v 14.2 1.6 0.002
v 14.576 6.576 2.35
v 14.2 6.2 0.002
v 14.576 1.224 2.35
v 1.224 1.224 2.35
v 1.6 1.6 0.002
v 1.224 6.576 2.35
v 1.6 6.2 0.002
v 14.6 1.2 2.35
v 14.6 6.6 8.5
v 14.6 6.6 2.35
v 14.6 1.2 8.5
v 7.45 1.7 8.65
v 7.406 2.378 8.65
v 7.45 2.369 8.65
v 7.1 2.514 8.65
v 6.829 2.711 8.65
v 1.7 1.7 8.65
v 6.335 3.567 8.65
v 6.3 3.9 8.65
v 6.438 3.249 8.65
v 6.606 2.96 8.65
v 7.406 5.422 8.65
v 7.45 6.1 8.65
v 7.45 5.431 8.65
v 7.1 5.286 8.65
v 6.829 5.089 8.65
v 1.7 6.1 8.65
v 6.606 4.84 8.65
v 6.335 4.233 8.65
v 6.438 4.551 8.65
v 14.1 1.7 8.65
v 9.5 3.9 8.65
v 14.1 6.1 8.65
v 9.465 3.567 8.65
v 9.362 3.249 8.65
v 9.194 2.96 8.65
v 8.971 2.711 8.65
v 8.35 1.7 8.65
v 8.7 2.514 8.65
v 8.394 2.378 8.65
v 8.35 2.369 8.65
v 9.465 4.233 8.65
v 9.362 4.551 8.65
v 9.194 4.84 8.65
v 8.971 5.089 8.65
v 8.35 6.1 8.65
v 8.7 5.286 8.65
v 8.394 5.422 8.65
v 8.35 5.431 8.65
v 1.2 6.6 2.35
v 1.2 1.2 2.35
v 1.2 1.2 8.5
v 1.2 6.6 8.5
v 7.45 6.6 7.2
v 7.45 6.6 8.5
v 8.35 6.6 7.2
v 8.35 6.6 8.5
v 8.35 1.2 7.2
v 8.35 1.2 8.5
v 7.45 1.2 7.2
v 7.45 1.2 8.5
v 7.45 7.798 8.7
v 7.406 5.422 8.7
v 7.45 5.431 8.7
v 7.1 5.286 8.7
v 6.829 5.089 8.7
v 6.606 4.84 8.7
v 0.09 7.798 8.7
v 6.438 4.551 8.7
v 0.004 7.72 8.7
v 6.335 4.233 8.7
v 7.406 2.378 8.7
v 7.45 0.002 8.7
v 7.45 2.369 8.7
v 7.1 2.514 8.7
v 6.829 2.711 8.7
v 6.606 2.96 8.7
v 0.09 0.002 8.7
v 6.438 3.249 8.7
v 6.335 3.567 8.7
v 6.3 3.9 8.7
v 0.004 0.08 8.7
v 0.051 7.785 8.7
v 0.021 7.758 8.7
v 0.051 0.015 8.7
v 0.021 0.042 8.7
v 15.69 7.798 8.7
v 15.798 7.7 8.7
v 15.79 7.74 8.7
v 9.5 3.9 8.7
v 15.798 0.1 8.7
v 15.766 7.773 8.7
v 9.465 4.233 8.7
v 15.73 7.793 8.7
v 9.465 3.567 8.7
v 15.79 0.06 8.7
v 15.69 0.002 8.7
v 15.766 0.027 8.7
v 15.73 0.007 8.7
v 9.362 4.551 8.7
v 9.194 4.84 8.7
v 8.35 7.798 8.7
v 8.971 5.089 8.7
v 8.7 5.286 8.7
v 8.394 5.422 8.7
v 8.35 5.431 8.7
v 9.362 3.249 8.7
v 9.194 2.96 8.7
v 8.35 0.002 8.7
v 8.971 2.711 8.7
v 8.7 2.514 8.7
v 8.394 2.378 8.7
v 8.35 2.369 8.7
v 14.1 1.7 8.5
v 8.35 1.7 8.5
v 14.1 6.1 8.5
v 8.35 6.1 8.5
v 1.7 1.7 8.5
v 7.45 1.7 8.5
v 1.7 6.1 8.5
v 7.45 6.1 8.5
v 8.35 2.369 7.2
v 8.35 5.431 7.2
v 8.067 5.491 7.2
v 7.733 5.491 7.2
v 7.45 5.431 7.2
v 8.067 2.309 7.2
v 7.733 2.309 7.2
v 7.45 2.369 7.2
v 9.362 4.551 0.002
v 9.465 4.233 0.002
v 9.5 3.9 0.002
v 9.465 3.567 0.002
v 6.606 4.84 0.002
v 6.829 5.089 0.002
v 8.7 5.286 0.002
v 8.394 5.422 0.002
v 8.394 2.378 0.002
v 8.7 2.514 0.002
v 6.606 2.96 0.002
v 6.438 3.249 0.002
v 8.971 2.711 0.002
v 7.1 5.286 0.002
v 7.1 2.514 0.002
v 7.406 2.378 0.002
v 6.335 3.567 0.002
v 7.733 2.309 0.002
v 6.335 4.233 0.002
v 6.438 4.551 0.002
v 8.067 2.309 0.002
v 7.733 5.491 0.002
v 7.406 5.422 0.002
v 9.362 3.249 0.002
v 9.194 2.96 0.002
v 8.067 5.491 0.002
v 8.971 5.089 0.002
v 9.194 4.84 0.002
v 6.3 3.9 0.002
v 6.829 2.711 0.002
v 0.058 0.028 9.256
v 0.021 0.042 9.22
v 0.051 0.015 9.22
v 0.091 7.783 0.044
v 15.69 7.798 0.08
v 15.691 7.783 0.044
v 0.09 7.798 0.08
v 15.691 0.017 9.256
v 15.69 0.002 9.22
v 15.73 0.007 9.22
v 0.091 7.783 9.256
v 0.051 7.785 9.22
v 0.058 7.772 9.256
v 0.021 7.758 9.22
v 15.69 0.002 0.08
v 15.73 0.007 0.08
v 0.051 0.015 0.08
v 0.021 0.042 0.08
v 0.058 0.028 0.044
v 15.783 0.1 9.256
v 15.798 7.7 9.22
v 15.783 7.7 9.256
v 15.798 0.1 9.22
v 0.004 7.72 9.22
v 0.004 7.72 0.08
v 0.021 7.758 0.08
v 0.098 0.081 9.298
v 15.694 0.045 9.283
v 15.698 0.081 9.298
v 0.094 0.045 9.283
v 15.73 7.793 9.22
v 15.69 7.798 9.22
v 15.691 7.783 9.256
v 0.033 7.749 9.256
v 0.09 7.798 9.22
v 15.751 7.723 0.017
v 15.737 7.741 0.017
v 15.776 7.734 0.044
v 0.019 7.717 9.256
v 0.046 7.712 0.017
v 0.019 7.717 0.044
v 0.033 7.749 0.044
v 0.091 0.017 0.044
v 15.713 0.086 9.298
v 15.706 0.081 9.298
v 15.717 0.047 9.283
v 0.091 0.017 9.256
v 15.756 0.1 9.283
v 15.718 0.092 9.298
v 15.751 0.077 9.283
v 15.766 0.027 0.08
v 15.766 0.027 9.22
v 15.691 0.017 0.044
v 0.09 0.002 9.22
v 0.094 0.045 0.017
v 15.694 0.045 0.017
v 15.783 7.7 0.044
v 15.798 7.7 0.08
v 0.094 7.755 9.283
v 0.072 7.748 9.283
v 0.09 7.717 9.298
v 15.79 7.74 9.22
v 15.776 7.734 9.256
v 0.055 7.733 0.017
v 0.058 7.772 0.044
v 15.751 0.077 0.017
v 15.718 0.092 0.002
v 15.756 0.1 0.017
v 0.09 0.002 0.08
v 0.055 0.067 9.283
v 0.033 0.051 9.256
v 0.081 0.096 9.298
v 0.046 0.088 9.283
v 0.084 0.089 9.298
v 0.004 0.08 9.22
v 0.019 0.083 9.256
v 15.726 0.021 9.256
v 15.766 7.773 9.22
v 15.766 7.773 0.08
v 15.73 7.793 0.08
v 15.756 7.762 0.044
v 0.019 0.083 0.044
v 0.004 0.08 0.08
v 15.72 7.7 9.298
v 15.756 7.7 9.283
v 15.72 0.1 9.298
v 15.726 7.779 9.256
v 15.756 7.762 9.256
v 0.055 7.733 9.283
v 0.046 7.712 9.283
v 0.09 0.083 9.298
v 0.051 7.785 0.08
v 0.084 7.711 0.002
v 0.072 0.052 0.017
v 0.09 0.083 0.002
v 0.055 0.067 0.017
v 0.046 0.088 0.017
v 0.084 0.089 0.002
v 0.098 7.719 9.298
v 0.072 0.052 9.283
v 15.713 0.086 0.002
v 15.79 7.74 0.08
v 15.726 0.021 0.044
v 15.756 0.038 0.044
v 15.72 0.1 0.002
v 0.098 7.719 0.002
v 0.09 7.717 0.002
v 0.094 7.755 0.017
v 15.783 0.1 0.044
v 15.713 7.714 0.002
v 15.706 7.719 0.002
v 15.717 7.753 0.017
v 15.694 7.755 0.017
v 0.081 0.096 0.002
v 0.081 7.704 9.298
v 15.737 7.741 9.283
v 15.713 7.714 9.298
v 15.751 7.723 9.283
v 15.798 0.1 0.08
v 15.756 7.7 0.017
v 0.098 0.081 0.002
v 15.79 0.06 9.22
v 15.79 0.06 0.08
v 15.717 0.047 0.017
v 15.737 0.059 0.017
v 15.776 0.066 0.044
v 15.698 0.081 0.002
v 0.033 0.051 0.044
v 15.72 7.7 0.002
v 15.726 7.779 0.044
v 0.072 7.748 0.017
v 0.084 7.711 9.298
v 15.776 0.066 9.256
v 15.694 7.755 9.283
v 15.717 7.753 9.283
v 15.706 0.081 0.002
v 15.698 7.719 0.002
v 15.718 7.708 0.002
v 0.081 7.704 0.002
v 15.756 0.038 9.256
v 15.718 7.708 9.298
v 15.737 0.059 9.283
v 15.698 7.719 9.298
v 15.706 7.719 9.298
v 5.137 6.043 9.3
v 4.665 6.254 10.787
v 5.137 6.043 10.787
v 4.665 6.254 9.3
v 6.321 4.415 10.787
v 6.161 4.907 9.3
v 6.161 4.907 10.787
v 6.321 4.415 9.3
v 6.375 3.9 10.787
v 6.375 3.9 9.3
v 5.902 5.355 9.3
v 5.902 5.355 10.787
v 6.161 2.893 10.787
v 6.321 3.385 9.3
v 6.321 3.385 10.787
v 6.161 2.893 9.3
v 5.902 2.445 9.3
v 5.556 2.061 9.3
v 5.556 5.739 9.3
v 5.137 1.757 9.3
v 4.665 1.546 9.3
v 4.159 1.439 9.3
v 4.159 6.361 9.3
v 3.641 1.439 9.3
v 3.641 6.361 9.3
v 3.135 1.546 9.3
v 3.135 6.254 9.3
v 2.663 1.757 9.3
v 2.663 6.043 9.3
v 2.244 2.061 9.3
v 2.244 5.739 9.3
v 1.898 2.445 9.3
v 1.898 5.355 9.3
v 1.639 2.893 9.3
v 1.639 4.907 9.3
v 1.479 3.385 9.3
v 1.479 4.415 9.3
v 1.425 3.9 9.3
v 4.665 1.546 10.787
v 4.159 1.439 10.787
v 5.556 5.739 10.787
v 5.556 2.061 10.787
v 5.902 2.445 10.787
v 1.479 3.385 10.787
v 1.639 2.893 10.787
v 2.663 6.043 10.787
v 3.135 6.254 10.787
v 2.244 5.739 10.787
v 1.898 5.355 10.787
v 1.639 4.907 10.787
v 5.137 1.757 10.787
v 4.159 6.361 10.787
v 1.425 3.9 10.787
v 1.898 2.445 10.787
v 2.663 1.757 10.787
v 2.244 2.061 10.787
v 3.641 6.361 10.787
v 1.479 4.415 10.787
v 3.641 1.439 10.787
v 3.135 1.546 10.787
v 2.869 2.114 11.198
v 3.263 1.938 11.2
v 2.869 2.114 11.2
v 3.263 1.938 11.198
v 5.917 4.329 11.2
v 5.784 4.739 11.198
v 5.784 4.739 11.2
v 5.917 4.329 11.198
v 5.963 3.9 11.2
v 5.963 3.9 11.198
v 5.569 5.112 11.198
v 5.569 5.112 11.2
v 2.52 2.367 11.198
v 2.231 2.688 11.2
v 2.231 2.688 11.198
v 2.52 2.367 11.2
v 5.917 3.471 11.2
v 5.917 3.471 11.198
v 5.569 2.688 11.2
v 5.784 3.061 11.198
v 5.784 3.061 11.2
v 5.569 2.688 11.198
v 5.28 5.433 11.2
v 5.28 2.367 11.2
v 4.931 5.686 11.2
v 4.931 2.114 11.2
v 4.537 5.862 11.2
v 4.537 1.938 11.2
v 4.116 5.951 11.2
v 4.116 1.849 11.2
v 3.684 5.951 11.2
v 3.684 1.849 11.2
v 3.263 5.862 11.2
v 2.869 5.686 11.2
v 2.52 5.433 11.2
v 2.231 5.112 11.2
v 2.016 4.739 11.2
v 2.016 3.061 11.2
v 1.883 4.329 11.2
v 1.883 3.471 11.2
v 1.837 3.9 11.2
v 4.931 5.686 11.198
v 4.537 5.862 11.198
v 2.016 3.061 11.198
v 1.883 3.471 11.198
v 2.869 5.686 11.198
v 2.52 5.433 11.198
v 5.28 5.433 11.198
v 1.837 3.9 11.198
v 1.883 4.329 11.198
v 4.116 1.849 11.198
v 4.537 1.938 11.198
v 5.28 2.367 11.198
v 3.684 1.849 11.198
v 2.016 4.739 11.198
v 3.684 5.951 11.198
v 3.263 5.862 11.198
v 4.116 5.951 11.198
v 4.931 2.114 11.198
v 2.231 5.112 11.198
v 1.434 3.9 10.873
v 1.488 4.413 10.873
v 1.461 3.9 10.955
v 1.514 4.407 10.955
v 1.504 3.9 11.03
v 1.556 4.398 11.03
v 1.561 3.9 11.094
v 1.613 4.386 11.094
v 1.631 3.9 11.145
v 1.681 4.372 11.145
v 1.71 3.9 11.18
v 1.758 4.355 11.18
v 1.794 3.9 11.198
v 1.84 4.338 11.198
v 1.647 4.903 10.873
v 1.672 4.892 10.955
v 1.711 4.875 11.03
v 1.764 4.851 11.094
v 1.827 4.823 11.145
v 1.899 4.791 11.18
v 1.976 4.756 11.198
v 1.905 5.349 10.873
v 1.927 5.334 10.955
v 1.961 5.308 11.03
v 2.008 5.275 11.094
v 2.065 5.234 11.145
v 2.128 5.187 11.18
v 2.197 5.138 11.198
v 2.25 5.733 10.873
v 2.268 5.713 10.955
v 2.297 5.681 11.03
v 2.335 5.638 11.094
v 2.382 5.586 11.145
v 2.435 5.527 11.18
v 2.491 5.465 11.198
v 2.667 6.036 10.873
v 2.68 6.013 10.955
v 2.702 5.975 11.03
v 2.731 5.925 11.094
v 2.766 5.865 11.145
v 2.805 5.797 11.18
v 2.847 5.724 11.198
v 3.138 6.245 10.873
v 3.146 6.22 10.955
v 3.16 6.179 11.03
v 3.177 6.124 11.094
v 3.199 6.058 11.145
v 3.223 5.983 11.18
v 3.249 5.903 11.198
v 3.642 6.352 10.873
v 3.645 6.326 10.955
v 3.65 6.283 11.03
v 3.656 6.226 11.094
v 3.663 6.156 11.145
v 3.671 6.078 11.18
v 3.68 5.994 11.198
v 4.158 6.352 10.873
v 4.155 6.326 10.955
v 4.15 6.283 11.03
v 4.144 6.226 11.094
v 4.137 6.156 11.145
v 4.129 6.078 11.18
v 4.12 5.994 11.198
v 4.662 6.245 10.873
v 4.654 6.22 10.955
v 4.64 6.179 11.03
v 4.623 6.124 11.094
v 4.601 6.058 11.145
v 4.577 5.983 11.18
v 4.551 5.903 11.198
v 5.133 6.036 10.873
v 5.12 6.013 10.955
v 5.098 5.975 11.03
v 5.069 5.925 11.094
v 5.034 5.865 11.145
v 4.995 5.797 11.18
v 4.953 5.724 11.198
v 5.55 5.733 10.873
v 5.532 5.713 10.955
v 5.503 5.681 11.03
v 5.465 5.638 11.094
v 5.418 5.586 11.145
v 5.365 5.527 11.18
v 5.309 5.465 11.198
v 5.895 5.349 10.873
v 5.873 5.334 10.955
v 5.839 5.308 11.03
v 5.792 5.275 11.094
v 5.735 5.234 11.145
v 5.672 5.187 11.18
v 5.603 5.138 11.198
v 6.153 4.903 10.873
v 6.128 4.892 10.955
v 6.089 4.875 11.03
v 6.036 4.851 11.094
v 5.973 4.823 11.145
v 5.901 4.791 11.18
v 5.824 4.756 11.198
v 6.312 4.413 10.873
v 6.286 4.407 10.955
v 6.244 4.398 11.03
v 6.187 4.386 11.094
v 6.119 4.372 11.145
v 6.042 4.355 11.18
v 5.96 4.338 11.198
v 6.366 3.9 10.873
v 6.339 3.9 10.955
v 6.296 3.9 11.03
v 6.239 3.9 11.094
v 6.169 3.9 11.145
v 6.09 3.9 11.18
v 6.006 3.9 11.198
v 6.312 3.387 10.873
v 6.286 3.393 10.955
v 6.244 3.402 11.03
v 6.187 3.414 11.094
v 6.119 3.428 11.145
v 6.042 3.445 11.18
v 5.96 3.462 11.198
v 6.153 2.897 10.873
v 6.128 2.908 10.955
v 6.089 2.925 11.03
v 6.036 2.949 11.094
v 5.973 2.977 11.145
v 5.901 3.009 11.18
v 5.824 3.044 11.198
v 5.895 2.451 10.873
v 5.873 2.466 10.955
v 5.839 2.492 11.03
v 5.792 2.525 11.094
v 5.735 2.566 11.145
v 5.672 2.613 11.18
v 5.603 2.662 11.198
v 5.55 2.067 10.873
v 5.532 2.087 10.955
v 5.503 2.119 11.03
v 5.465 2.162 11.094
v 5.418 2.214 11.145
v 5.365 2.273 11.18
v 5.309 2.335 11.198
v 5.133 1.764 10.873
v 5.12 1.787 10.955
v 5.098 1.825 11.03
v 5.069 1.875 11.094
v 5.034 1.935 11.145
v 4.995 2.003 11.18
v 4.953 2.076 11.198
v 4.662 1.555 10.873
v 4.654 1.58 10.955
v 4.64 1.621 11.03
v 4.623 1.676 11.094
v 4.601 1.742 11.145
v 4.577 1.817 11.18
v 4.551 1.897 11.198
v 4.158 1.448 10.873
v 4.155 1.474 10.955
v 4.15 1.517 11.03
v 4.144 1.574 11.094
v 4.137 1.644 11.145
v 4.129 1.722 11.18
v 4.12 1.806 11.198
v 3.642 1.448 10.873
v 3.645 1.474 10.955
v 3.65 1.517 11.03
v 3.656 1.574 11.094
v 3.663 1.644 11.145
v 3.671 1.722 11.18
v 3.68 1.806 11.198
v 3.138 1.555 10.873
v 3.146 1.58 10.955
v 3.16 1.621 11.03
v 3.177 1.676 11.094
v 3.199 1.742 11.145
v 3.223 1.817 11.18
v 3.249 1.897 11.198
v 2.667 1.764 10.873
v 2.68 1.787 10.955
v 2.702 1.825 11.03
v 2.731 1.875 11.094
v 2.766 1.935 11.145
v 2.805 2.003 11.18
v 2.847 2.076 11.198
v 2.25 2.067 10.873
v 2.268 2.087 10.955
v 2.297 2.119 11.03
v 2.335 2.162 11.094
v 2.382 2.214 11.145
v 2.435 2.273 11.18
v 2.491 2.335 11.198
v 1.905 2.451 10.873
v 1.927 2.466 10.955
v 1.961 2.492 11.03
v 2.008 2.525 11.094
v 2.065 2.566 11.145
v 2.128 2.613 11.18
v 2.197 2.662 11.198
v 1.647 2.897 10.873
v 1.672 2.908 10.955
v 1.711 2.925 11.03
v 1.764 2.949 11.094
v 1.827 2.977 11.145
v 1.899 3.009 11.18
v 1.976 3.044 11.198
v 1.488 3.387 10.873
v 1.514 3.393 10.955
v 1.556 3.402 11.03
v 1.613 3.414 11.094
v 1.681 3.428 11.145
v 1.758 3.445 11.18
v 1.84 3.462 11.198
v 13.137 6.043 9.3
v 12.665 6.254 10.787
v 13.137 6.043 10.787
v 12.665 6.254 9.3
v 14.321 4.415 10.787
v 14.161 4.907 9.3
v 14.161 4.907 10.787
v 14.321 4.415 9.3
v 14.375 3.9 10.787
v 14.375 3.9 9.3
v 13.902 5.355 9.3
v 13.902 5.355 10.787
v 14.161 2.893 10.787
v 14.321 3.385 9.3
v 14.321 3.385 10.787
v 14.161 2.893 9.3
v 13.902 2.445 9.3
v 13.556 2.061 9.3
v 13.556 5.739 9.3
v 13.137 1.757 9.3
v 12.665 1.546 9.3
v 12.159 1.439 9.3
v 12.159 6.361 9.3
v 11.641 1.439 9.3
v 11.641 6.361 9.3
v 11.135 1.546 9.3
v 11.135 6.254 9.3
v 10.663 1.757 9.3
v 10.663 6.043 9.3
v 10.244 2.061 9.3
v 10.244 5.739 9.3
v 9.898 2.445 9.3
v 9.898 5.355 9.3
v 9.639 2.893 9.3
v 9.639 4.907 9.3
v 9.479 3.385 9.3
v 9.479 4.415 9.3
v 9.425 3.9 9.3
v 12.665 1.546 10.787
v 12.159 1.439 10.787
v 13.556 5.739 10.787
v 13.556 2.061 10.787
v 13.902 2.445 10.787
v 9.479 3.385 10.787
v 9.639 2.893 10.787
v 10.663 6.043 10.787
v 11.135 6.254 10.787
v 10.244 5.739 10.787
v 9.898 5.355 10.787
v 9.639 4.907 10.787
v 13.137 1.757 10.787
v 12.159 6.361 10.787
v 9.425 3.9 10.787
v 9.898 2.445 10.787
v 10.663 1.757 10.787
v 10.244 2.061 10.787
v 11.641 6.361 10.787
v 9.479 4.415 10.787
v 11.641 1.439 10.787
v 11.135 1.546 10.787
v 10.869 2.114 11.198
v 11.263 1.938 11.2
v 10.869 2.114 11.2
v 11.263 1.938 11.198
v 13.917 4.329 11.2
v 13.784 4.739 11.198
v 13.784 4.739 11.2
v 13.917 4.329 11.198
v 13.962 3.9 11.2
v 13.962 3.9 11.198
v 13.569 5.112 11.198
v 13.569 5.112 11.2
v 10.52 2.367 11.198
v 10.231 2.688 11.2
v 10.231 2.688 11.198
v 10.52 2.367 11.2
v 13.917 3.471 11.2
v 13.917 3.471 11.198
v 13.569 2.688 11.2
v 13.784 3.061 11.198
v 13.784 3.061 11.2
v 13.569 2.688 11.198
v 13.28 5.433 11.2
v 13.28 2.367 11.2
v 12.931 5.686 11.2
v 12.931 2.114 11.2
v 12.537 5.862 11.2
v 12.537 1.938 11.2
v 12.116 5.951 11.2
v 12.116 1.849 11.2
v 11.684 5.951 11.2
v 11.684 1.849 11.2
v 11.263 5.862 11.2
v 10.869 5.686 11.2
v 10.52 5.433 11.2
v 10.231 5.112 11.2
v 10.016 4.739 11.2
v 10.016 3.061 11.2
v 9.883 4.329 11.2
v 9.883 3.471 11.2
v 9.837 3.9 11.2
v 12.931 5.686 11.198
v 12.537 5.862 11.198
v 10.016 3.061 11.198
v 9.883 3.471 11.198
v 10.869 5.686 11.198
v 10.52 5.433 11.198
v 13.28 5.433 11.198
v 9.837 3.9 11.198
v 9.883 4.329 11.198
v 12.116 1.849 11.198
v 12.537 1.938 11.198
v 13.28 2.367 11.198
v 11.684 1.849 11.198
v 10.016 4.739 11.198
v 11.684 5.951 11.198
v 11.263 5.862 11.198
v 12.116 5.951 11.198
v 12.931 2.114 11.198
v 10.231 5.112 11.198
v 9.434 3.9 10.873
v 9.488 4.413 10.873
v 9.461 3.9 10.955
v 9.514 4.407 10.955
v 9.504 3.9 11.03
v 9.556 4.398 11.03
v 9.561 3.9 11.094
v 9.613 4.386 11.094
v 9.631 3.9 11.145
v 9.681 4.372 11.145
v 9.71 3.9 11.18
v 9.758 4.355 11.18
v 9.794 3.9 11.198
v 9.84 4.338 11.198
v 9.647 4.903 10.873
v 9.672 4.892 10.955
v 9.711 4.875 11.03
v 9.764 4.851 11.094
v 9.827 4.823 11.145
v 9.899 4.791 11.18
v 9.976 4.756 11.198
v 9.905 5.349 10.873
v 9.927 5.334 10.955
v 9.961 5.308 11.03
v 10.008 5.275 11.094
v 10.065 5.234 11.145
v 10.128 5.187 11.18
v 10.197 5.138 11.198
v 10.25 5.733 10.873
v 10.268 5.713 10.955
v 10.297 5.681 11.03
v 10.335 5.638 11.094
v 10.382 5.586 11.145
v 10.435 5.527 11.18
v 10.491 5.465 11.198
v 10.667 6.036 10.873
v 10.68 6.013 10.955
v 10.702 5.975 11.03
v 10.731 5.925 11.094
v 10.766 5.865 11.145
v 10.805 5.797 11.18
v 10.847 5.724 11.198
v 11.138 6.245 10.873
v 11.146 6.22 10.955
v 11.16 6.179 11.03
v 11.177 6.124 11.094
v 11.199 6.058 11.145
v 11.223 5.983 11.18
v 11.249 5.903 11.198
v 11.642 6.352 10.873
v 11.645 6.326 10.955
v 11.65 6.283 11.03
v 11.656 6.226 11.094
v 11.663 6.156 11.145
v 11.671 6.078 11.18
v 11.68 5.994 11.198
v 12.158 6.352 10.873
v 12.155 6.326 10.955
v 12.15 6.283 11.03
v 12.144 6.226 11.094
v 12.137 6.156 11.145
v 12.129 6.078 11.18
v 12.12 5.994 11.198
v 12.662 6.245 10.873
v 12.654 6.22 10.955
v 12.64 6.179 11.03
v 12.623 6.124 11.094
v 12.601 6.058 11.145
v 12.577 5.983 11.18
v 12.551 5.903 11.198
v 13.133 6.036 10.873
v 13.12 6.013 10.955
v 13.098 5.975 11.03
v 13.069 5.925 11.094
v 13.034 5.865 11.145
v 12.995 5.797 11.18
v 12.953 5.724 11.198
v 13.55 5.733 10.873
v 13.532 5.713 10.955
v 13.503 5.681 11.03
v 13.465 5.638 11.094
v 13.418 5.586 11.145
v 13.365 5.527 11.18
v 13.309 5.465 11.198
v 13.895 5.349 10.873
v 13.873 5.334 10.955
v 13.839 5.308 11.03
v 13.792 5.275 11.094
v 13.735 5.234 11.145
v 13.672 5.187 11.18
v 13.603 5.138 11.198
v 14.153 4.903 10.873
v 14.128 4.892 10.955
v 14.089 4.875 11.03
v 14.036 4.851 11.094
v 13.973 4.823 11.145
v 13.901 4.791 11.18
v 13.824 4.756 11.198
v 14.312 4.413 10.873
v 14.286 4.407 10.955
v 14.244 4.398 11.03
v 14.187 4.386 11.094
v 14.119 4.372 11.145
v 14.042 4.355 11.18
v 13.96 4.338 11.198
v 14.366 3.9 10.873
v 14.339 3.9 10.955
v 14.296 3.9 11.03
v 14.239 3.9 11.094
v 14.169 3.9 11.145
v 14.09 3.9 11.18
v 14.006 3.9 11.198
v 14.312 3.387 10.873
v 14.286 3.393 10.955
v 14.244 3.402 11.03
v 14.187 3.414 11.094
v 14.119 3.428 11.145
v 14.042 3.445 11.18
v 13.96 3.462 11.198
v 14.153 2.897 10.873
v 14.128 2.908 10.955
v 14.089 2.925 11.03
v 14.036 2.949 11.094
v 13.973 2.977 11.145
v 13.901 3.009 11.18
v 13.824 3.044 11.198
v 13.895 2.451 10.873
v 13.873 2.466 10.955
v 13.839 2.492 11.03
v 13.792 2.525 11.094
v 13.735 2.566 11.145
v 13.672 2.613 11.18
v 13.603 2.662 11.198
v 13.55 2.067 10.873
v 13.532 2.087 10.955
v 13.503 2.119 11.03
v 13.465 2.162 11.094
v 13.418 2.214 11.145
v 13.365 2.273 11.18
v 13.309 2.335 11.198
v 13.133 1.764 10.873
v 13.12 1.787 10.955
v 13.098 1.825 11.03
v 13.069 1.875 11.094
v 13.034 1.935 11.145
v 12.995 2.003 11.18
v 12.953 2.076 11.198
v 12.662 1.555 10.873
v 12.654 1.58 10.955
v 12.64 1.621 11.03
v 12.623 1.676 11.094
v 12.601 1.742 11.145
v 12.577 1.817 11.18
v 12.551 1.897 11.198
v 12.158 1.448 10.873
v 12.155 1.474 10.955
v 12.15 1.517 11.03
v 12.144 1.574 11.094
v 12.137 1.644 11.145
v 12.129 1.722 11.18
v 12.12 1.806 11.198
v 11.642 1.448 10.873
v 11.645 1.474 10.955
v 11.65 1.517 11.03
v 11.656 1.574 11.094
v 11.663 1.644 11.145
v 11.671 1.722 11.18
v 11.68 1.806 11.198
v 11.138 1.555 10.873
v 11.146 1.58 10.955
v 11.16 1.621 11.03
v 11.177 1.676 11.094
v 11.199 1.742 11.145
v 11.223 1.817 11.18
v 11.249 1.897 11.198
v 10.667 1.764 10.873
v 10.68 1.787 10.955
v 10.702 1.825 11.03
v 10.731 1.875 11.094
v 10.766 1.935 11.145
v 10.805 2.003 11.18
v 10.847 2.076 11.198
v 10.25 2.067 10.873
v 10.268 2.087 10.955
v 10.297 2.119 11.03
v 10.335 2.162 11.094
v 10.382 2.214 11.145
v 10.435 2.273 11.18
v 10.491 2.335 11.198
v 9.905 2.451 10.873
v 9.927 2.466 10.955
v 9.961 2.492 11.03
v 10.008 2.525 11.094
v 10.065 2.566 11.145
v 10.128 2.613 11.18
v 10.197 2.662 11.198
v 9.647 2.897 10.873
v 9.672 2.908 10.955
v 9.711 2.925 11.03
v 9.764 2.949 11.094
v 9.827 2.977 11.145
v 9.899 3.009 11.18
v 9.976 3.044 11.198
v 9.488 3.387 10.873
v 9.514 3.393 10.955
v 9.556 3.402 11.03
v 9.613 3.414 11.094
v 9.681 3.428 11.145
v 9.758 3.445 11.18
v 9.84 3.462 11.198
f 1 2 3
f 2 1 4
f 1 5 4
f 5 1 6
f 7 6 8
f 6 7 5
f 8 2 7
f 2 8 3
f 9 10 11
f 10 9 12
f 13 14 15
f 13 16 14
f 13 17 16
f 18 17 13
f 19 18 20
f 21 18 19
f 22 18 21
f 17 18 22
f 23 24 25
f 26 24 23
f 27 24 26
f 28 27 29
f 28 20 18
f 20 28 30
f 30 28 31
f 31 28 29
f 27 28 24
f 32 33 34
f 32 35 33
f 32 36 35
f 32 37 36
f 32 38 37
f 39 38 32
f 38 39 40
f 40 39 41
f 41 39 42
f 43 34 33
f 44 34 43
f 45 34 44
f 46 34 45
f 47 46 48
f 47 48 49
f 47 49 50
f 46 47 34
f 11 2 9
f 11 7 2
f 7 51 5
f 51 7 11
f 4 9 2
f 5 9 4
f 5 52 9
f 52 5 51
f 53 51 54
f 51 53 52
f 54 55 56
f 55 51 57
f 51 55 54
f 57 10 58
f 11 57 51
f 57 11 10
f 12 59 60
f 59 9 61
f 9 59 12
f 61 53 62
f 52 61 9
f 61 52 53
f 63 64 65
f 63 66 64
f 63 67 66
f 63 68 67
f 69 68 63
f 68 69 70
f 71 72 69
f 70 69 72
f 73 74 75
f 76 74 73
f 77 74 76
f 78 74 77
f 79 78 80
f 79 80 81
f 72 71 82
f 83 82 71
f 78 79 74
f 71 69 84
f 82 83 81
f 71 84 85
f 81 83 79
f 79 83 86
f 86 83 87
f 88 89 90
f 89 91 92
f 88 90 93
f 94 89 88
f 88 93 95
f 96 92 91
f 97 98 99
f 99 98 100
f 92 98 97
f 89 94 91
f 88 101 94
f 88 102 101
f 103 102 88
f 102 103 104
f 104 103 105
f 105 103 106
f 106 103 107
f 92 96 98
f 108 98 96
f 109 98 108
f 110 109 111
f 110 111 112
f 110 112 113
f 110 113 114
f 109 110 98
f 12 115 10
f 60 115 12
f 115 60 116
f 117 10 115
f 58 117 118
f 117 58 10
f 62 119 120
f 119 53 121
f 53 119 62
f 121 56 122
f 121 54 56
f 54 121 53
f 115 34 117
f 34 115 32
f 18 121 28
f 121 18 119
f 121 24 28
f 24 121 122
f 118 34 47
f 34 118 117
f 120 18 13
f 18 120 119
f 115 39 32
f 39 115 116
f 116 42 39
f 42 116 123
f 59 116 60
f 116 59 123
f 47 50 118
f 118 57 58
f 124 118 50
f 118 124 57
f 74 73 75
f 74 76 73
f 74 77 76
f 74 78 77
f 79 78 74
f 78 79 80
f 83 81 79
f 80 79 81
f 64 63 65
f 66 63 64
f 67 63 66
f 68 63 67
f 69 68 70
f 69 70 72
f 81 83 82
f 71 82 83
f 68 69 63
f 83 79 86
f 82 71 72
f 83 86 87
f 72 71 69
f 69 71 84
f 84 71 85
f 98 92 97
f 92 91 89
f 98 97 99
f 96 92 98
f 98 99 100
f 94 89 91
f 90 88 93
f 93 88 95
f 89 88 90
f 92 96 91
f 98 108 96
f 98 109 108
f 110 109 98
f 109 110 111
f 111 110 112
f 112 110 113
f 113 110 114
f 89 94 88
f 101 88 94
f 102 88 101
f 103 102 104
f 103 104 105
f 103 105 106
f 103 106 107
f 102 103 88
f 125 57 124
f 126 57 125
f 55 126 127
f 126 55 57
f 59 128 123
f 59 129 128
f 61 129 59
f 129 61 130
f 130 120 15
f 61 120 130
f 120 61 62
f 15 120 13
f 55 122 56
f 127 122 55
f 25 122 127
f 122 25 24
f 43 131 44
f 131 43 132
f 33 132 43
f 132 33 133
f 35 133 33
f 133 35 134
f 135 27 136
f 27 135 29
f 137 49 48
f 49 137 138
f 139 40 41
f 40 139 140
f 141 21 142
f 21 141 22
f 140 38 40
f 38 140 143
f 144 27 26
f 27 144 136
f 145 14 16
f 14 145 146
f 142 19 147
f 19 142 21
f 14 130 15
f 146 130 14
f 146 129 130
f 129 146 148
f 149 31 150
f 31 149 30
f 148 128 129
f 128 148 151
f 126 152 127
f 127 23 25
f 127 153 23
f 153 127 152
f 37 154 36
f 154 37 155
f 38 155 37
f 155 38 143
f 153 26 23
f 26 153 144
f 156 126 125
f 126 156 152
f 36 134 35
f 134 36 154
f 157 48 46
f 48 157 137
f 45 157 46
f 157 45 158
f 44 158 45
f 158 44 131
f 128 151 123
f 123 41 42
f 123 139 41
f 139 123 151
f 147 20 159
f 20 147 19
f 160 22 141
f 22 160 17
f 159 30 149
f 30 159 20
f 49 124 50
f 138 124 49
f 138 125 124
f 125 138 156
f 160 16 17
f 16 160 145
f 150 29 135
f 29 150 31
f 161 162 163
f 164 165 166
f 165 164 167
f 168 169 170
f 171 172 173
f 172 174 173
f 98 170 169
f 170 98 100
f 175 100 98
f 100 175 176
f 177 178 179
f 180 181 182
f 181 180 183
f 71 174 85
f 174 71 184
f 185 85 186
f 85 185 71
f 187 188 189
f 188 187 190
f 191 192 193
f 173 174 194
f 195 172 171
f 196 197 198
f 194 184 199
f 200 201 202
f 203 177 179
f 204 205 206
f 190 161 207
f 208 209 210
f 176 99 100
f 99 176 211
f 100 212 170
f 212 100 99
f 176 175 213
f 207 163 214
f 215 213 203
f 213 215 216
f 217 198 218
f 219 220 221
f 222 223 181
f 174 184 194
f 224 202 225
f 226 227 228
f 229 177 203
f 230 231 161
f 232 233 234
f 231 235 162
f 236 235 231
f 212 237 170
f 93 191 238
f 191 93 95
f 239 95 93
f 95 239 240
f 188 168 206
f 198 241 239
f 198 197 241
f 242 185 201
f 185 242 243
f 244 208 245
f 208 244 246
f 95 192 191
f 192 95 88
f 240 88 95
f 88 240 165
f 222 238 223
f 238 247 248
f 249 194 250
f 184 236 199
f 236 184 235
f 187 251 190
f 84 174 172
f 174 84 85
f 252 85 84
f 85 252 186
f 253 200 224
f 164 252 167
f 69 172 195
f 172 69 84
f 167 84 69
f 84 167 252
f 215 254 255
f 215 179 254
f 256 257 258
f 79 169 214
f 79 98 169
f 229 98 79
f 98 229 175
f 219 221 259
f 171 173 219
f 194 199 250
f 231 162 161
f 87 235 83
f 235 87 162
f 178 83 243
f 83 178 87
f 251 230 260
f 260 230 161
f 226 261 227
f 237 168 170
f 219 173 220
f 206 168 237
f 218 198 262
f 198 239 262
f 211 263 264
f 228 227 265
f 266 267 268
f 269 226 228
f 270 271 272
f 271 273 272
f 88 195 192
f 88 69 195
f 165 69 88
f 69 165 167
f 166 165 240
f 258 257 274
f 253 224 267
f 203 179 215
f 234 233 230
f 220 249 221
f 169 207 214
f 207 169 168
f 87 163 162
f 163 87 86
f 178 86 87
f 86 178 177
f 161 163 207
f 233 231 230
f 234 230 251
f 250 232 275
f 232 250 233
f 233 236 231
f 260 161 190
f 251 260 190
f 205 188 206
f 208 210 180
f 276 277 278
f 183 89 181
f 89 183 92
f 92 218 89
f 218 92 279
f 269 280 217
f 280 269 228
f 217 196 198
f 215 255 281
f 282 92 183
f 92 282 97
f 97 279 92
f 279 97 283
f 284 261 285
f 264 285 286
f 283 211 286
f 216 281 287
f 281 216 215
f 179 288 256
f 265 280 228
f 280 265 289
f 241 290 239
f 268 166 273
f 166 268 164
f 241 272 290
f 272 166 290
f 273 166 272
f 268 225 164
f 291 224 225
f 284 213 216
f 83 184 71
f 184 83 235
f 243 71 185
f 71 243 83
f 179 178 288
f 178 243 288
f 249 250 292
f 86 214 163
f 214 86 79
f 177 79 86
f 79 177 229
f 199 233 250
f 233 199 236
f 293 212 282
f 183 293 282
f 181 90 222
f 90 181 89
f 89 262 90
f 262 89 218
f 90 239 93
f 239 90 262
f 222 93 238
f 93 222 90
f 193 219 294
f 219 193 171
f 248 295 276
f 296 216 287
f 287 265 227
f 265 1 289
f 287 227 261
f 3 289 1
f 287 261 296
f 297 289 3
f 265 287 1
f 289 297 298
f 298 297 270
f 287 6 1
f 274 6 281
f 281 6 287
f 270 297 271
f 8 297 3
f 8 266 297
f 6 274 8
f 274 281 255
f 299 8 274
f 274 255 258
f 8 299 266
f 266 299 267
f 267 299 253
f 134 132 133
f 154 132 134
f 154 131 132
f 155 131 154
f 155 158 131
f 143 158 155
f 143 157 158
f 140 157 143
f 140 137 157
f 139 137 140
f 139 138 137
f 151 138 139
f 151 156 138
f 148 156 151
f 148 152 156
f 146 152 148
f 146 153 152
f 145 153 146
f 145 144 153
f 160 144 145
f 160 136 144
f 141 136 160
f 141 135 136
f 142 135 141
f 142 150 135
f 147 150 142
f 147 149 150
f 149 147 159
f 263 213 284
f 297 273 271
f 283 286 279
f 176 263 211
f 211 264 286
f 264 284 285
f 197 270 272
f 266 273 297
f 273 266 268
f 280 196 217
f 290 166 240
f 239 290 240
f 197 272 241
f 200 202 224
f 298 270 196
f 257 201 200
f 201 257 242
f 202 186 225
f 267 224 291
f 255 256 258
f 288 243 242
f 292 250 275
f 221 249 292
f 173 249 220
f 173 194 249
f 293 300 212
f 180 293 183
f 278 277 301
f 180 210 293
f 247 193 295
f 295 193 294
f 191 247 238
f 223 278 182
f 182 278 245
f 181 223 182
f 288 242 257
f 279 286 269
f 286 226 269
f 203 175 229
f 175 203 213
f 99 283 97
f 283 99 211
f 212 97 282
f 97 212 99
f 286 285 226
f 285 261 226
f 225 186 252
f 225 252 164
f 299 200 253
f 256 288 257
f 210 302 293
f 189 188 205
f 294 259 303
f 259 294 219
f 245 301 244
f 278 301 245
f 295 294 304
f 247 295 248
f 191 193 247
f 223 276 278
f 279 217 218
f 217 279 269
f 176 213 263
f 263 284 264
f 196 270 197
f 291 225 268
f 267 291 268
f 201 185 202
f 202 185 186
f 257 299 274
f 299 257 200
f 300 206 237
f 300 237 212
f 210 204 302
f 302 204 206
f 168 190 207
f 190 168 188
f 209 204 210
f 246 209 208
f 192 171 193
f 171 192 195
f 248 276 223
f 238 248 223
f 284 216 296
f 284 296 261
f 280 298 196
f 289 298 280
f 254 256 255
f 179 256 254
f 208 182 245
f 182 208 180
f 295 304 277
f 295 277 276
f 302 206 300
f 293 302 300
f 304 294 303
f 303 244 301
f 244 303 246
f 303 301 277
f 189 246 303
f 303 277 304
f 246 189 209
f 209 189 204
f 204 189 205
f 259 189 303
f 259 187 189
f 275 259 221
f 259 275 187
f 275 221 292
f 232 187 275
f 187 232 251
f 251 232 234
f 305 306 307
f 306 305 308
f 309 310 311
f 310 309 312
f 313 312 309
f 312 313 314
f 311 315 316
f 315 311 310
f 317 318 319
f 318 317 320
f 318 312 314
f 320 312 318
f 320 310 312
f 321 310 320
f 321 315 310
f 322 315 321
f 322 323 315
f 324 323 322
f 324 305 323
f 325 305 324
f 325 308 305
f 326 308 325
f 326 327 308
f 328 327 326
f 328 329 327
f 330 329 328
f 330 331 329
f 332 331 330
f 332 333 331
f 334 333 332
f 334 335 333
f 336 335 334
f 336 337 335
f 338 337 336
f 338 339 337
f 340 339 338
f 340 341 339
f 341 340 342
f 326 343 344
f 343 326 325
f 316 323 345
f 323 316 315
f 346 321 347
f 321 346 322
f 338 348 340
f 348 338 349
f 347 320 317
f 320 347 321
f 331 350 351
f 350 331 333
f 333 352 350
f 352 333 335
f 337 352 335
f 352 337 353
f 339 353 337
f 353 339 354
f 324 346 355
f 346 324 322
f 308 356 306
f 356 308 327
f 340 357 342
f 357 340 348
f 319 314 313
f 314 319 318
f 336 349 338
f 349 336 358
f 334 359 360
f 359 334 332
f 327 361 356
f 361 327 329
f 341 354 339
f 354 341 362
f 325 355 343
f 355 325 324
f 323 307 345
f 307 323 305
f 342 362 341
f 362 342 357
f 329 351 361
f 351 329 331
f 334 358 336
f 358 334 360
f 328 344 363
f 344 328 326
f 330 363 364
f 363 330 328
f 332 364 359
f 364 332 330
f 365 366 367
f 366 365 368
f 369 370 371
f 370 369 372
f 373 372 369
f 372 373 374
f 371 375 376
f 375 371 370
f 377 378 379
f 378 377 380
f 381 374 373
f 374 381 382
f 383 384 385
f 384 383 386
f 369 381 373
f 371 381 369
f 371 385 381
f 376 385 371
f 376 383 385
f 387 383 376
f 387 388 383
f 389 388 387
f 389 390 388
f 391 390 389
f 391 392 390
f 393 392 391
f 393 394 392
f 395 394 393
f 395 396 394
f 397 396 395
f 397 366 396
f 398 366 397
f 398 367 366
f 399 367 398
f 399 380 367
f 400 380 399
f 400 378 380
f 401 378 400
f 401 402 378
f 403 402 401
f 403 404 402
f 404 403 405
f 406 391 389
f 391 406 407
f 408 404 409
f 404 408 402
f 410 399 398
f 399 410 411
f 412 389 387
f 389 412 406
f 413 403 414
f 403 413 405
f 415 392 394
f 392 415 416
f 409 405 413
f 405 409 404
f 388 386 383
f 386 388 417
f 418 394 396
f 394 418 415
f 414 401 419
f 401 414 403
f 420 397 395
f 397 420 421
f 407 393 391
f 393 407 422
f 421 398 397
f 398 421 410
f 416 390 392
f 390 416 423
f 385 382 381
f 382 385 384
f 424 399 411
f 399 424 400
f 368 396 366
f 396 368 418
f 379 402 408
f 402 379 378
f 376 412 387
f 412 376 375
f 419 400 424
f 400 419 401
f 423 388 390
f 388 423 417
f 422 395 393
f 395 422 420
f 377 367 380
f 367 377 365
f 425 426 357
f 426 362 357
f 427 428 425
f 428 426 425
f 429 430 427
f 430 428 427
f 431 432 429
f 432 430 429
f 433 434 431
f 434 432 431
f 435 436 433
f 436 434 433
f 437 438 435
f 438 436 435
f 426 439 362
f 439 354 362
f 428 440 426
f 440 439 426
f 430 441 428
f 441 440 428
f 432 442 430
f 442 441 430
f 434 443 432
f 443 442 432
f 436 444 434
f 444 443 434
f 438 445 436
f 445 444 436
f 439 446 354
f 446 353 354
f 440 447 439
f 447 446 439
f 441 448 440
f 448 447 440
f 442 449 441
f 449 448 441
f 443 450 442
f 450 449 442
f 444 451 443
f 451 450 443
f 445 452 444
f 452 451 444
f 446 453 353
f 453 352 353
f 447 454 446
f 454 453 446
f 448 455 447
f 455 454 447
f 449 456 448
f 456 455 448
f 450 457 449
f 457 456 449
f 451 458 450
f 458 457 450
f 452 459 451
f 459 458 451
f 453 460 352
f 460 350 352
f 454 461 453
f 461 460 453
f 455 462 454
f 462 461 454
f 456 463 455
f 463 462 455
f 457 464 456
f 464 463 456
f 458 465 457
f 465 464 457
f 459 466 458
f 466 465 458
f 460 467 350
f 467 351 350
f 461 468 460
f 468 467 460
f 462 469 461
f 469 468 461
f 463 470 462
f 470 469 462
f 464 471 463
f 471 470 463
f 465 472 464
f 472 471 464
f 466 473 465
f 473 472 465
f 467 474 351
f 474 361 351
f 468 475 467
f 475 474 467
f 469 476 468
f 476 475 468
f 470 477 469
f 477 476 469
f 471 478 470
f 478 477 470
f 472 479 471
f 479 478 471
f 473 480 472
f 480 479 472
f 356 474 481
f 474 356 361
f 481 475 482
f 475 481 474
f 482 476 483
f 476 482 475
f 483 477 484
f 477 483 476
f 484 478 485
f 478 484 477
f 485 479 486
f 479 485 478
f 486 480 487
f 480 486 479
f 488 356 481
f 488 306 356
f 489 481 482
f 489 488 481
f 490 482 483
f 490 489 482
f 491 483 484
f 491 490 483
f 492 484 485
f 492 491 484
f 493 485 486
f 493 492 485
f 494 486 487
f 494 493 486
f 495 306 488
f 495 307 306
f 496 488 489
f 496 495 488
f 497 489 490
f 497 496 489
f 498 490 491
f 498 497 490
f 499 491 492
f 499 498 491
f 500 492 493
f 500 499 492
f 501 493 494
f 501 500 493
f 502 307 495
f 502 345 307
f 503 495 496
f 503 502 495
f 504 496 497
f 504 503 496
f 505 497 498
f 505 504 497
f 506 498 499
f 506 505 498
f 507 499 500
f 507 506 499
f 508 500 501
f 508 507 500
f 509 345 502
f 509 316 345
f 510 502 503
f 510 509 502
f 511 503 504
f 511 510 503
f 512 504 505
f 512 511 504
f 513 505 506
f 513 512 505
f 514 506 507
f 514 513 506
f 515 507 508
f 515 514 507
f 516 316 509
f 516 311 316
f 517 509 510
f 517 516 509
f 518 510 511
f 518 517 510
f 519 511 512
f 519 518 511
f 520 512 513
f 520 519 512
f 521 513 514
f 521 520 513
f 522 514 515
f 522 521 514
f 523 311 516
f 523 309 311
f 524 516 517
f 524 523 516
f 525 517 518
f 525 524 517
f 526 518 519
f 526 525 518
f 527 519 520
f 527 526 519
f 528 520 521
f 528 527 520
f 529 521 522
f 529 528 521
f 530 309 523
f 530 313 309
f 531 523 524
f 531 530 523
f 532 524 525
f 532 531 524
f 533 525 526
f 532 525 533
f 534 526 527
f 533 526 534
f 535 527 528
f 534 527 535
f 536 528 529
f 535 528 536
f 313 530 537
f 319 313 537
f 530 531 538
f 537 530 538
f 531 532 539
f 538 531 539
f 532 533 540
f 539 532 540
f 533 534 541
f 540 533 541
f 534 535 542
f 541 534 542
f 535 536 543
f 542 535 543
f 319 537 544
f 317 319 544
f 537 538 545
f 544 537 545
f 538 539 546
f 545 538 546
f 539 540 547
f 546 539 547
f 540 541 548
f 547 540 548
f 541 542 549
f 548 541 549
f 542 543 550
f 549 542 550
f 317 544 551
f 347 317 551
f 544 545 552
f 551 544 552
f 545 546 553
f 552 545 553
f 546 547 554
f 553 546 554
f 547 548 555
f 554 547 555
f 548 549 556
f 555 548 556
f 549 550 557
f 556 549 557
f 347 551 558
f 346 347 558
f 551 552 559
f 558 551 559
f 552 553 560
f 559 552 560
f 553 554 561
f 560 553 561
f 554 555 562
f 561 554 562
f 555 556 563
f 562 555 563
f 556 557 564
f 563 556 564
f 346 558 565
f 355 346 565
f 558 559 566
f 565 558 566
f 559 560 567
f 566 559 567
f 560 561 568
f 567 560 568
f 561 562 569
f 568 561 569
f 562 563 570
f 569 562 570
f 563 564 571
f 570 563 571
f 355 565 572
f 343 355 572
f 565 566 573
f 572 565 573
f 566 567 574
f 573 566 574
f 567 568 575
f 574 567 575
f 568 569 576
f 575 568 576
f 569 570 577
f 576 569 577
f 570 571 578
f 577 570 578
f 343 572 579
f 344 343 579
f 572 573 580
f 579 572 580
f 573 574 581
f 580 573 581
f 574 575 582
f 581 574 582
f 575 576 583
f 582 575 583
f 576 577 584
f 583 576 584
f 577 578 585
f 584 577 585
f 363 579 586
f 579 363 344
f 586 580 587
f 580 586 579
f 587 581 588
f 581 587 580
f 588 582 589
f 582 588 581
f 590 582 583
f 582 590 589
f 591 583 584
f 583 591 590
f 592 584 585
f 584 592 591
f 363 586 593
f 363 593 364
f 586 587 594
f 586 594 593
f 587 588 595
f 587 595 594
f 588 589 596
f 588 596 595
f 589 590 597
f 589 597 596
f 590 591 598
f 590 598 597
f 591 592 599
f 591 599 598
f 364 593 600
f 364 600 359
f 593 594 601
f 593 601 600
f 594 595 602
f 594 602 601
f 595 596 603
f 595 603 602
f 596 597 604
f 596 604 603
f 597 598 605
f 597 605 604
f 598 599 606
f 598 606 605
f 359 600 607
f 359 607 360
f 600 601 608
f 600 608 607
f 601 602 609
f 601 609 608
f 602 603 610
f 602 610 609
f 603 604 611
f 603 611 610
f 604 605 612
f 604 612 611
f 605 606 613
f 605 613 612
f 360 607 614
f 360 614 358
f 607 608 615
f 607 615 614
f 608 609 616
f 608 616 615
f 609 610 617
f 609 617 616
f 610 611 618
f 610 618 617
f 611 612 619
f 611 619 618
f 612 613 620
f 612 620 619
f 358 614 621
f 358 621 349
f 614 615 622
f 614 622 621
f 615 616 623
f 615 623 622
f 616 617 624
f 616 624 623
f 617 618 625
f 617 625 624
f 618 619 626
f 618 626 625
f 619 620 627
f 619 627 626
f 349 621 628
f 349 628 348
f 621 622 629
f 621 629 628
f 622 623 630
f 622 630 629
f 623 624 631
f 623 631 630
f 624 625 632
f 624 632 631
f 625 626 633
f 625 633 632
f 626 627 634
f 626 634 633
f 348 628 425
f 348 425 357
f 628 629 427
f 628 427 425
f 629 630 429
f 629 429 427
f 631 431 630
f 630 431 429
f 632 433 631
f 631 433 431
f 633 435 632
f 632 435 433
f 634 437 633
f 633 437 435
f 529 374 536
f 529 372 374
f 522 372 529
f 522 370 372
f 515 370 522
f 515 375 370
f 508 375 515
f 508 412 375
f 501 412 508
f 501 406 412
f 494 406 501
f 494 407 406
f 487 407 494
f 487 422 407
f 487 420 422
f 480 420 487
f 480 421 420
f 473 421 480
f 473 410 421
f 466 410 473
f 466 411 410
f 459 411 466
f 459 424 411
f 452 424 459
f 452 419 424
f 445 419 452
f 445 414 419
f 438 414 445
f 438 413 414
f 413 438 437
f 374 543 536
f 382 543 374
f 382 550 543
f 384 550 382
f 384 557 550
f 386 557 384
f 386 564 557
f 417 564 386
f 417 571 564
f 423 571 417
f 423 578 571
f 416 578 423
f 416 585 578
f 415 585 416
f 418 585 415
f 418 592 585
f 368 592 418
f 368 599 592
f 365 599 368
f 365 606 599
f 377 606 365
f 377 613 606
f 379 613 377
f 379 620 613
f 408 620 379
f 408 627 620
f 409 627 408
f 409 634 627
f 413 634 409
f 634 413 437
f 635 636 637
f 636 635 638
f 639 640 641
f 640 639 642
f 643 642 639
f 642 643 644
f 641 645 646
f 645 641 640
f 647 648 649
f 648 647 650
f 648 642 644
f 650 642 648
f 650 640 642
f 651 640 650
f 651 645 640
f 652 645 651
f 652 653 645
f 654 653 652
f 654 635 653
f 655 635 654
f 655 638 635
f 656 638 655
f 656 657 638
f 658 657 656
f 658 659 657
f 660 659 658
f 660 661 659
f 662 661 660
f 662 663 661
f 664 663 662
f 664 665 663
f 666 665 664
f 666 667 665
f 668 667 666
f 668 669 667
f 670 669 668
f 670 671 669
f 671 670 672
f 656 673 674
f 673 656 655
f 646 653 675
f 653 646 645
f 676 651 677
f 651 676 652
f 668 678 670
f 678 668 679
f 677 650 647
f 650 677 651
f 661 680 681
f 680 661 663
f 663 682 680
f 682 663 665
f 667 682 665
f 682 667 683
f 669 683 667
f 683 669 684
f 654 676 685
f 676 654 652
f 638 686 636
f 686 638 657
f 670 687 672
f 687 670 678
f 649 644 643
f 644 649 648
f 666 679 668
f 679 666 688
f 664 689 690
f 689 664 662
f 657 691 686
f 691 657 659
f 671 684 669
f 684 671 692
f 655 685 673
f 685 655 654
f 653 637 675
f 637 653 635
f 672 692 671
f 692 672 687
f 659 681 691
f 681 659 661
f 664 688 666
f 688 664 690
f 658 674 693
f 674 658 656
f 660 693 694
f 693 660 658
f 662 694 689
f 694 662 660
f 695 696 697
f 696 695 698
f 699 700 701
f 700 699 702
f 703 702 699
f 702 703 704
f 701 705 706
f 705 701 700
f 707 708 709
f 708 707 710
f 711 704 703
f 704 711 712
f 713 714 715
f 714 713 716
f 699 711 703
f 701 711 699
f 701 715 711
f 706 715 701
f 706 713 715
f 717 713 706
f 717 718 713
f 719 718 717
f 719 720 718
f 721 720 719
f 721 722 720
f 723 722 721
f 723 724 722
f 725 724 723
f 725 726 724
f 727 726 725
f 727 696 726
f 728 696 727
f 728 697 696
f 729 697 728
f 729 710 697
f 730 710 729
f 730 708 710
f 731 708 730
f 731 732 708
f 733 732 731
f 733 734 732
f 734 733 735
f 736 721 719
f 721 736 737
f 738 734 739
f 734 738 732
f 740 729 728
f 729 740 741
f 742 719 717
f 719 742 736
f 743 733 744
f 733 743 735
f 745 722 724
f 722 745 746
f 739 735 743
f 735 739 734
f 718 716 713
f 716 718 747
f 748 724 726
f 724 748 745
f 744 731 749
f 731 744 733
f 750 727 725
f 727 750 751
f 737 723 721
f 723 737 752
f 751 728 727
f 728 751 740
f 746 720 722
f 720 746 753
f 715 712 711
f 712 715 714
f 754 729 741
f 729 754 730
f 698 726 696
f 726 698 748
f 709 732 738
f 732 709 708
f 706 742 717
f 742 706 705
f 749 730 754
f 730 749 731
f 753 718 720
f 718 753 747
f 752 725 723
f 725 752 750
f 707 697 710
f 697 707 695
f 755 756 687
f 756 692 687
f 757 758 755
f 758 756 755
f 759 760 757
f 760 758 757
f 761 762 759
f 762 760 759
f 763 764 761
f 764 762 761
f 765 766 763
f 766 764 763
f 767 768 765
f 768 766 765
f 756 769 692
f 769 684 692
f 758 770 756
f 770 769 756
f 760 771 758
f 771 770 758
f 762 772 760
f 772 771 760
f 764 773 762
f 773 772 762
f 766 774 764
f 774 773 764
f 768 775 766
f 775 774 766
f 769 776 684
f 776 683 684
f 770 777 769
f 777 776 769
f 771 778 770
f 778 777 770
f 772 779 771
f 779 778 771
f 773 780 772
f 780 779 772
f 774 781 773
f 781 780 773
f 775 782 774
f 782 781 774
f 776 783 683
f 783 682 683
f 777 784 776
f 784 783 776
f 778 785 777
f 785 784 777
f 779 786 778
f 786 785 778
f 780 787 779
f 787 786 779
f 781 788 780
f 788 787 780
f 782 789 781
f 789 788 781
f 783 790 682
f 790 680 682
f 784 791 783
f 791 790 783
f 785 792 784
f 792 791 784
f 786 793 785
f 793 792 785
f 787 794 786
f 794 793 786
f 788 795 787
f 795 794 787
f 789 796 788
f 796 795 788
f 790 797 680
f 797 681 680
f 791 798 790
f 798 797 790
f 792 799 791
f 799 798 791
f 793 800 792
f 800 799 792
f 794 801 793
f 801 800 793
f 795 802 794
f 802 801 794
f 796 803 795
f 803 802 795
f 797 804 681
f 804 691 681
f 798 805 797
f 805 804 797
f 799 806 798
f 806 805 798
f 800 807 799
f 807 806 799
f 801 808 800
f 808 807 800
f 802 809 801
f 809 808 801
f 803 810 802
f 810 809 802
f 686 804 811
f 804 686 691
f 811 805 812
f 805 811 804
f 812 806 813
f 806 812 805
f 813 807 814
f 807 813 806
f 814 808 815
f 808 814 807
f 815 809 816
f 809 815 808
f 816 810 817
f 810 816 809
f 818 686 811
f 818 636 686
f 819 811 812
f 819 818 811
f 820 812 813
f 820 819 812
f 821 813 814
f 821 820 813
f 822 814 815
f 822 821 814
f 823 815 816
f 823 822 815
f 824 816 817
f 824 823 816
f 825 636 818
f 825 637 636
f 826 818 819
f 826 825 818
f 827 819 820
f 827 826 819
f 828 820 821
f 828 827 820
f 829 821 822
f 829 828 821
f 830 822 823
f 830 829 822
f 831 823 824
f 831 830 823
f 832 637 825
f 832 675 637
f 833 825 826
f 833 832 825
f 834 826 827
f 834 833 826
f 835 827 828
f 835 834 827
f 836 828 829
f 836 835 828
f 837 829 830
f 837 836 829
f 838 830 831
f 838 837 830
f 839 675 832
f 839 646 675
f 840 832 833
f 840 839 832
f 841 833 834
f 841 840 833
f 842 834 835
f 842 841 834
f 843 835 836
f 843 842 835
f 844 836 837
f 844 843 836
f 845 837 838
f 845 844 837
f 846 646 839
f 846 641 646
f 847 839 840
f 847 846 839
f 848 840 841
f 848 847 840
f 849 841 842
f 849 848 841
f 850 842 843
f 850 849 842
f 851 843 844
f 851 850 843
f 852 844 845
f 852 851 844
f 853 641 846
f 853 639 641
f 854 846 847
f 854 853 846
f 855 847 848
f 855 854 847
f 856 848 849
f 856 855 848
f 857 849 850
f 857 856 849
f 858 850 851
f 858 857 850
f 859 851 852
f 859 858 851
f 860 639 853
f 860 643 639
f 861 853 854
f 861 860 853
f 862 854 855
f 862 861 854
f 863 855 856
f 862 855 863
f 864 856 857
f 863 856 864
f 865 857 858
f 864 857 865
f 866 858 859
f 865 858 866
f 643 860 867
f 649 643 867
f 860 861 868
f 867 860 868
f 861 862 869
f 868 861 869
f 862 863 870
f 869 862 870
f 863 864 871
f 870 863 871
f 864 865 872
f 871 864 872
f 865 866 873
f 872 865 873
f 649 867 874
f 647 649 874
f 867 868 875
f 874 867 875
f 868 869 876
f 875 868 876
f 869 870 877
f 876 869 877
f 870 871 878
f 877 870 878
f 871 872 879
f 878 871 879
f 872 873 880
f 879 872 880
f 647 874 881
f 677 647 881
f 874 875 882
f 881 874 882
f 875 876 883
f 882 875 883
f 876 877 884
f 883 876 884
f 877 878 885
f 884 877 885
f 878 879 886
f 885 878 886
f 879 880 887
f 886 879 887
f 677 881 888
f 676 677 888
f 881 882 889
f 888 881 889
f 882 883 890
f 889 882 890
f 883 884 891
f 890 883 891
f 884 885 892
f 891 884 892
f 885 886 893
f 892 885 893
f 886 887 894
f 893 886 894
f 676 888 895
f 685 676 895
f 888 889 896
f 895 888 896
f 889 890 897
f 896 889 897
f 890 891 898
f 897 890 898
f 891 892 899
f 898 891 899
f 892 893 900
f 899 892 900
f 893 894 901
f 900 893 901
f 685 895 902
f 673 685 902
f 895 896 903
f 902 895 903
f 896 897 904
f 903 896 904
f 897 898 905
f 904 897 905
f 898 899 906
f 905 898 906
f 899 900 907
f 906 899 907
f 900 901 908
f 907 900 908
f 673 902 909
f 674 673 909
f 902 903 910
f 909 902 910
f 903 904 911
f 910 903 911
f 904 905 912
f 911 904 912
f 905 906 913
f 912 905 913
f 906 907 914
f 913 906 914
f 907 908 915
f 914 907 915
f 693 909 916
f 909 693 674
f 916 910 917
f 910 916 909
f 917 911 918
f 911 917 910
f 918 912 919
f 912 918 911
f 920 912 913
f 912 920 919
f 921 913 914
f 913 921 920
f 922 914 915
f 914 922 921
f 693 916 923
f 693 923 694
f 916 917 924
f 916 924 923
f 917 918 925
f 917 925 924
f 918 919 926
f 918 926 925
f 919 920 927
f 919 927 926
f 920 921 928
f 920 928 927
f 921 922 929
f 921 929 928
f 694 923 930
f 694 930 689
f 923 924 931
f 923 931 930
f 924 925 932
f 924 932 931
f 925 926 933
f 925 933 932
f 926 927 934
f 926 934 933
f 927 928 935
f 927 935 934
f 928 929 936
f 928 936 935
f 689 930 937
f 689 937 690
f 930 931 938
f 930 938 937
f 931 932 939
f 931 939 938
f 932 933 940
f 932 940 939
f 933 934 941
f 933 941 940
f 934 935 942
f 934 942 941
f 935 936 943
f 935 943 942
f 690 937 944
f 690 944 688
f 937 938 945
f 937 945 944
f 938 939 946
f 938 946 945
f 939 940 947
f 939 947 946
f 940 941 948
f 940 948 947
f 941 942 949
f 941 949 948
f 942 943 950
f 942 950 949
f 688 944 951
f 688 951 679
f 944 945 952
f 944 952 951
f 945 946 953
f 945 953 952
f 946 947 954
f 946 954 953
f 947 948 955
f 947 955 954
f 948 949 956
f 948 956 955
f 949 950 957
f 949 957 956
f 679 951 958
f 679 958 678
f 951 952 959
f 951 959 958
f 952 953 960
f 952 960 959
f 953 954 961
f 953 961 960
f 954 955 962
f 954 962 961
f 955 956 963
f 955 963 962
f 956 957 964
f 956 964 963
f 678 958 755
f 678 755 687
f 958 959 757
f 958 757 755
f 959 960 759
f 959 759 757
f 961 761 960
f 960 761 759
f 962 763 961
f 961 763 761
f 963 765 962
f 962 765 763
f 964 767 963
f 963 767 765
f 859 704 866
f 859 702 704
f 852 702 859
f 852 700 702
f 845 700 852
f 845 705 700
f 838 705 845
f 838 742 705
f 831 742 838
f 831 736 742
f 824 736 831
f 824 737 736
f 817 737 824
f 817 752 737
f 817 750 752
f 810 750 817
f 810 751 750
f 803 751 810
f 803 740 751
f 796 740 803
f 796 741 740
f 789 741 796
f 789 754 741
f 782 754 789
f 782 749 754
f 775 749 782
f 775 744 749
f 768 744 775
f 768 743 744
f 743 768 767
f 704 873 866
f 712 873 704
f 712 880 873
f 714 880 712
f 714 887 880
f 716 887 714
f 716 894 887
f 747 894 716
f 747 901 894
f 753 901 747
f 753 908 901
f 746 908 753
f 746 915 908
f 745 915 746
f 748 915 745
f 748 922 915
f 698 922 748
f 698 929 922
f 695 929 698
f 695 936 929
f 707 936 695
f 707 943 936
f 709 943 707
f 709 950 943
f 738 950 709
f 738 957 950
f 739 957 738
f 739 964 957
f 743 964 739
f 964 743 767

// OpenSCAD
// file: ../../lib/brick-hollow.scad
/**
* Machine Blocks
* https://machinemania.net/blocks 
*
* Brick Hollow
* Copyright (c) 2022 Jan Philipp Knoeller <pk@pksoftware.de>
*
* Published under license:
* Creative Commons Attribution-NonCommercial-ShareAlike 4.0 International 
* https://creativecommons.org/licenses/by-nc-sa/4.0/
*
*/
echo(version=version());

module brickHollow(height=9.3, fade=2.5, minSize=[4.6,4.6], maxSize=[5.2, 5.2], center = false){
    echo(height, minSize, maxSize, fade);
    sizeX = max(minSize[0],maxSize[0]); 
   sizeY = max(minSize[1],maxSize[1]); 
    
    posX = center ? 0 : 0.5*sizeX; 
   posY = center ? 0 : 0.5*sizeY;   
   posZ = center ? -0.5 * (height-fade) : 0.5*fade;
    
    cutHelper = 0.2;
    overlapSpace=0.1;
    
    translate([posX, posY, posZ]){
        union(){
            polyhedron(points=[
                [-0.5*minSize[0],-0.5*minSize[1],-0.5*fade],
                [0.5*minSize[0],-0.5*minSize[1],-0.5*fade],
                [0.5*minSize[0],0.5*minSize[1],-0.5*fade],
                [-0.5*minSize[0],0.5*minSize[1],-0.5*fade],
                [-0.5*maxSize[0],-0.5*maxSize[1],0.5*fade],
                [0.5*maxSize[0],-0.5*maxSize[1],0.5*fade],
                [0.5*maxSize[0],0.5*maxSize[1],0.5*fade],
                [-0.5*maxSize[0],0.5*maxSize[1],0.5*fade]
            ], faces=[[0,1,2,3],[1,0,4,5],[2,1,5,6],[3,2,6,7],[0,3,7,4],[7,6,5,4]]);
            
            if(height > fade){
                translate([0,0,0.5*height - overlapSpace]){
                    cube([maxSize[0], maxSize[1], height - fade + overlapSpace], center=true);
                }
            }
            
            translate([0,0,-0.5*(fade + cutHelper) + overlapSpace]){
                cube([minSize[0], minSize[1], cutHelper + overlapSpace], center=true);
            }
        }
    }
}

//brickHollow(height=9.3, maxSize=[5.2,5.2], minSize=[4.6,4.6], center=true);
// file: ../../lib/roundedcube_simple.scad
/**
* Machine Blocks
* https://machinemania.net/blocks 
*
* Module for simple rounded cubes
* Copyright (c) 2022 Jan Philipp Knoeller <pk@pksoftware.de>
*
* Published under license:
* Creative Commons Attribution-NonCommercial-ShareAlike 4.0 International 
* https://creativecommons.org/licenses/by-nc-sa/4.0/
*
*/
module roundedcube_simple(size = [1, 1, 1], center = false, radius = 0.5, resolution = 20) {
	// If single value, convert to [x, y, z] vector
	size = (size[0] == undef) ? [size, size, size] : size;

	translate = (center == false) ?
		[radius, radius, radius] :
		[
			radius - (size[0] / 2),
			radius - (size[1] / 2),
			radius - (size[2] / 2)
	];

	translate(v = translate)
	minkowski() {
		cube(size = [
			size[0] - (radius * 2),
			size[1] - (radius * 2),
			size[2] - (radius * 2)
		]);
		sphere(r = radius, $fn = resolution);
	}
}
// file: ../../lib/roundedcube.scad
// More information: https://danielupshaw.com/openscad-rounded-corners/

// Set to 0.01 for higher definition curves (renders slower)
$fs = 0.15;

module roundedcube(size = [1, 1, 1], center = false, radius = 0.5, apply_to = "all", resolution = 20) {
	// If single value, convert to [x, y, z] vector
	size = (size[0] == undef) ? [size, size, size] : size;

	translate_min = radius;
	translate_xmax = size[0] - radius;
	translate_ymax = size[1] - radius;
	translate_zmax = size[2] - radius;

	diameter = radius * 2;

	obj_translate = (center == false) ?
		[0, 0, 0] : [
			-(size[0] / 2),
			-(size[1] / 2),
			-(size[2] / 2)
		];

	translate(v = obj_translate) {
		hull() {
			for (translate_x = [translate_min, translate_xmax]) {
				x_at = (translate_x == translate_min) ? "min" : "max";
				for (translate_y = [translate_min, translate_ymax]) {
					y_at = (translate_y == translate_min) ? "min" : "max";
					for (translate_z = [translate_min, translate_zmax]) {
						z_at = (translate_z == translate_min) ? "min" : "max";

						translate(v = [translate_x, translate_y, translate_z])
						if (
							(apply_to == "all") ||
							(apply_to == "xmin" && x_at == "min") || (apply_to == "xmax" && x_at == "max") ||
							(apply_to == "ymin" && y_at == "min") || (apply_to == "ymax" && y_at == "max") ||
							(apply_to == "zmin" && z_at == "min") || (apply_to == "zmax" && z_at == "max")
						) {
							sphere(r = radius, $fn = resolution);
						} else {
							rotate = 
								(apply_to == "xmin" || apply_to == "xmax" || apply_to == "x") ? [0, 90, 0] : (
								(apply_to == "ymin" || apply_to == "ymax" || apply_to == "y") ? [90, 90, 0] :
								[0, 0, 0]
							);
							rotate(a = rotate)
							cylinder(h = diameter, r = radius, center = true, $fn = resolution);
						}
					}
				}
			}
		}
	}
}
// main file
/**
* Machine Blocks
* https://machinemania.net/blocks 
*
* Brick 2x1 without knobs
* Copyright (c) 2022 Jan Philipp Knoeller <pk@pksoftware.de>
*
* Published under license:
* Creative Commons Attribution-NonCommercial-ShareAlike 4.0 International 
* https://creativecommons.org/licenses/by-nc-sa/4.0/
*
*/
echo(version=version());

include <../../lib/block-v2.scad>;

block(baseLayers=3, grid=[2,1]);
